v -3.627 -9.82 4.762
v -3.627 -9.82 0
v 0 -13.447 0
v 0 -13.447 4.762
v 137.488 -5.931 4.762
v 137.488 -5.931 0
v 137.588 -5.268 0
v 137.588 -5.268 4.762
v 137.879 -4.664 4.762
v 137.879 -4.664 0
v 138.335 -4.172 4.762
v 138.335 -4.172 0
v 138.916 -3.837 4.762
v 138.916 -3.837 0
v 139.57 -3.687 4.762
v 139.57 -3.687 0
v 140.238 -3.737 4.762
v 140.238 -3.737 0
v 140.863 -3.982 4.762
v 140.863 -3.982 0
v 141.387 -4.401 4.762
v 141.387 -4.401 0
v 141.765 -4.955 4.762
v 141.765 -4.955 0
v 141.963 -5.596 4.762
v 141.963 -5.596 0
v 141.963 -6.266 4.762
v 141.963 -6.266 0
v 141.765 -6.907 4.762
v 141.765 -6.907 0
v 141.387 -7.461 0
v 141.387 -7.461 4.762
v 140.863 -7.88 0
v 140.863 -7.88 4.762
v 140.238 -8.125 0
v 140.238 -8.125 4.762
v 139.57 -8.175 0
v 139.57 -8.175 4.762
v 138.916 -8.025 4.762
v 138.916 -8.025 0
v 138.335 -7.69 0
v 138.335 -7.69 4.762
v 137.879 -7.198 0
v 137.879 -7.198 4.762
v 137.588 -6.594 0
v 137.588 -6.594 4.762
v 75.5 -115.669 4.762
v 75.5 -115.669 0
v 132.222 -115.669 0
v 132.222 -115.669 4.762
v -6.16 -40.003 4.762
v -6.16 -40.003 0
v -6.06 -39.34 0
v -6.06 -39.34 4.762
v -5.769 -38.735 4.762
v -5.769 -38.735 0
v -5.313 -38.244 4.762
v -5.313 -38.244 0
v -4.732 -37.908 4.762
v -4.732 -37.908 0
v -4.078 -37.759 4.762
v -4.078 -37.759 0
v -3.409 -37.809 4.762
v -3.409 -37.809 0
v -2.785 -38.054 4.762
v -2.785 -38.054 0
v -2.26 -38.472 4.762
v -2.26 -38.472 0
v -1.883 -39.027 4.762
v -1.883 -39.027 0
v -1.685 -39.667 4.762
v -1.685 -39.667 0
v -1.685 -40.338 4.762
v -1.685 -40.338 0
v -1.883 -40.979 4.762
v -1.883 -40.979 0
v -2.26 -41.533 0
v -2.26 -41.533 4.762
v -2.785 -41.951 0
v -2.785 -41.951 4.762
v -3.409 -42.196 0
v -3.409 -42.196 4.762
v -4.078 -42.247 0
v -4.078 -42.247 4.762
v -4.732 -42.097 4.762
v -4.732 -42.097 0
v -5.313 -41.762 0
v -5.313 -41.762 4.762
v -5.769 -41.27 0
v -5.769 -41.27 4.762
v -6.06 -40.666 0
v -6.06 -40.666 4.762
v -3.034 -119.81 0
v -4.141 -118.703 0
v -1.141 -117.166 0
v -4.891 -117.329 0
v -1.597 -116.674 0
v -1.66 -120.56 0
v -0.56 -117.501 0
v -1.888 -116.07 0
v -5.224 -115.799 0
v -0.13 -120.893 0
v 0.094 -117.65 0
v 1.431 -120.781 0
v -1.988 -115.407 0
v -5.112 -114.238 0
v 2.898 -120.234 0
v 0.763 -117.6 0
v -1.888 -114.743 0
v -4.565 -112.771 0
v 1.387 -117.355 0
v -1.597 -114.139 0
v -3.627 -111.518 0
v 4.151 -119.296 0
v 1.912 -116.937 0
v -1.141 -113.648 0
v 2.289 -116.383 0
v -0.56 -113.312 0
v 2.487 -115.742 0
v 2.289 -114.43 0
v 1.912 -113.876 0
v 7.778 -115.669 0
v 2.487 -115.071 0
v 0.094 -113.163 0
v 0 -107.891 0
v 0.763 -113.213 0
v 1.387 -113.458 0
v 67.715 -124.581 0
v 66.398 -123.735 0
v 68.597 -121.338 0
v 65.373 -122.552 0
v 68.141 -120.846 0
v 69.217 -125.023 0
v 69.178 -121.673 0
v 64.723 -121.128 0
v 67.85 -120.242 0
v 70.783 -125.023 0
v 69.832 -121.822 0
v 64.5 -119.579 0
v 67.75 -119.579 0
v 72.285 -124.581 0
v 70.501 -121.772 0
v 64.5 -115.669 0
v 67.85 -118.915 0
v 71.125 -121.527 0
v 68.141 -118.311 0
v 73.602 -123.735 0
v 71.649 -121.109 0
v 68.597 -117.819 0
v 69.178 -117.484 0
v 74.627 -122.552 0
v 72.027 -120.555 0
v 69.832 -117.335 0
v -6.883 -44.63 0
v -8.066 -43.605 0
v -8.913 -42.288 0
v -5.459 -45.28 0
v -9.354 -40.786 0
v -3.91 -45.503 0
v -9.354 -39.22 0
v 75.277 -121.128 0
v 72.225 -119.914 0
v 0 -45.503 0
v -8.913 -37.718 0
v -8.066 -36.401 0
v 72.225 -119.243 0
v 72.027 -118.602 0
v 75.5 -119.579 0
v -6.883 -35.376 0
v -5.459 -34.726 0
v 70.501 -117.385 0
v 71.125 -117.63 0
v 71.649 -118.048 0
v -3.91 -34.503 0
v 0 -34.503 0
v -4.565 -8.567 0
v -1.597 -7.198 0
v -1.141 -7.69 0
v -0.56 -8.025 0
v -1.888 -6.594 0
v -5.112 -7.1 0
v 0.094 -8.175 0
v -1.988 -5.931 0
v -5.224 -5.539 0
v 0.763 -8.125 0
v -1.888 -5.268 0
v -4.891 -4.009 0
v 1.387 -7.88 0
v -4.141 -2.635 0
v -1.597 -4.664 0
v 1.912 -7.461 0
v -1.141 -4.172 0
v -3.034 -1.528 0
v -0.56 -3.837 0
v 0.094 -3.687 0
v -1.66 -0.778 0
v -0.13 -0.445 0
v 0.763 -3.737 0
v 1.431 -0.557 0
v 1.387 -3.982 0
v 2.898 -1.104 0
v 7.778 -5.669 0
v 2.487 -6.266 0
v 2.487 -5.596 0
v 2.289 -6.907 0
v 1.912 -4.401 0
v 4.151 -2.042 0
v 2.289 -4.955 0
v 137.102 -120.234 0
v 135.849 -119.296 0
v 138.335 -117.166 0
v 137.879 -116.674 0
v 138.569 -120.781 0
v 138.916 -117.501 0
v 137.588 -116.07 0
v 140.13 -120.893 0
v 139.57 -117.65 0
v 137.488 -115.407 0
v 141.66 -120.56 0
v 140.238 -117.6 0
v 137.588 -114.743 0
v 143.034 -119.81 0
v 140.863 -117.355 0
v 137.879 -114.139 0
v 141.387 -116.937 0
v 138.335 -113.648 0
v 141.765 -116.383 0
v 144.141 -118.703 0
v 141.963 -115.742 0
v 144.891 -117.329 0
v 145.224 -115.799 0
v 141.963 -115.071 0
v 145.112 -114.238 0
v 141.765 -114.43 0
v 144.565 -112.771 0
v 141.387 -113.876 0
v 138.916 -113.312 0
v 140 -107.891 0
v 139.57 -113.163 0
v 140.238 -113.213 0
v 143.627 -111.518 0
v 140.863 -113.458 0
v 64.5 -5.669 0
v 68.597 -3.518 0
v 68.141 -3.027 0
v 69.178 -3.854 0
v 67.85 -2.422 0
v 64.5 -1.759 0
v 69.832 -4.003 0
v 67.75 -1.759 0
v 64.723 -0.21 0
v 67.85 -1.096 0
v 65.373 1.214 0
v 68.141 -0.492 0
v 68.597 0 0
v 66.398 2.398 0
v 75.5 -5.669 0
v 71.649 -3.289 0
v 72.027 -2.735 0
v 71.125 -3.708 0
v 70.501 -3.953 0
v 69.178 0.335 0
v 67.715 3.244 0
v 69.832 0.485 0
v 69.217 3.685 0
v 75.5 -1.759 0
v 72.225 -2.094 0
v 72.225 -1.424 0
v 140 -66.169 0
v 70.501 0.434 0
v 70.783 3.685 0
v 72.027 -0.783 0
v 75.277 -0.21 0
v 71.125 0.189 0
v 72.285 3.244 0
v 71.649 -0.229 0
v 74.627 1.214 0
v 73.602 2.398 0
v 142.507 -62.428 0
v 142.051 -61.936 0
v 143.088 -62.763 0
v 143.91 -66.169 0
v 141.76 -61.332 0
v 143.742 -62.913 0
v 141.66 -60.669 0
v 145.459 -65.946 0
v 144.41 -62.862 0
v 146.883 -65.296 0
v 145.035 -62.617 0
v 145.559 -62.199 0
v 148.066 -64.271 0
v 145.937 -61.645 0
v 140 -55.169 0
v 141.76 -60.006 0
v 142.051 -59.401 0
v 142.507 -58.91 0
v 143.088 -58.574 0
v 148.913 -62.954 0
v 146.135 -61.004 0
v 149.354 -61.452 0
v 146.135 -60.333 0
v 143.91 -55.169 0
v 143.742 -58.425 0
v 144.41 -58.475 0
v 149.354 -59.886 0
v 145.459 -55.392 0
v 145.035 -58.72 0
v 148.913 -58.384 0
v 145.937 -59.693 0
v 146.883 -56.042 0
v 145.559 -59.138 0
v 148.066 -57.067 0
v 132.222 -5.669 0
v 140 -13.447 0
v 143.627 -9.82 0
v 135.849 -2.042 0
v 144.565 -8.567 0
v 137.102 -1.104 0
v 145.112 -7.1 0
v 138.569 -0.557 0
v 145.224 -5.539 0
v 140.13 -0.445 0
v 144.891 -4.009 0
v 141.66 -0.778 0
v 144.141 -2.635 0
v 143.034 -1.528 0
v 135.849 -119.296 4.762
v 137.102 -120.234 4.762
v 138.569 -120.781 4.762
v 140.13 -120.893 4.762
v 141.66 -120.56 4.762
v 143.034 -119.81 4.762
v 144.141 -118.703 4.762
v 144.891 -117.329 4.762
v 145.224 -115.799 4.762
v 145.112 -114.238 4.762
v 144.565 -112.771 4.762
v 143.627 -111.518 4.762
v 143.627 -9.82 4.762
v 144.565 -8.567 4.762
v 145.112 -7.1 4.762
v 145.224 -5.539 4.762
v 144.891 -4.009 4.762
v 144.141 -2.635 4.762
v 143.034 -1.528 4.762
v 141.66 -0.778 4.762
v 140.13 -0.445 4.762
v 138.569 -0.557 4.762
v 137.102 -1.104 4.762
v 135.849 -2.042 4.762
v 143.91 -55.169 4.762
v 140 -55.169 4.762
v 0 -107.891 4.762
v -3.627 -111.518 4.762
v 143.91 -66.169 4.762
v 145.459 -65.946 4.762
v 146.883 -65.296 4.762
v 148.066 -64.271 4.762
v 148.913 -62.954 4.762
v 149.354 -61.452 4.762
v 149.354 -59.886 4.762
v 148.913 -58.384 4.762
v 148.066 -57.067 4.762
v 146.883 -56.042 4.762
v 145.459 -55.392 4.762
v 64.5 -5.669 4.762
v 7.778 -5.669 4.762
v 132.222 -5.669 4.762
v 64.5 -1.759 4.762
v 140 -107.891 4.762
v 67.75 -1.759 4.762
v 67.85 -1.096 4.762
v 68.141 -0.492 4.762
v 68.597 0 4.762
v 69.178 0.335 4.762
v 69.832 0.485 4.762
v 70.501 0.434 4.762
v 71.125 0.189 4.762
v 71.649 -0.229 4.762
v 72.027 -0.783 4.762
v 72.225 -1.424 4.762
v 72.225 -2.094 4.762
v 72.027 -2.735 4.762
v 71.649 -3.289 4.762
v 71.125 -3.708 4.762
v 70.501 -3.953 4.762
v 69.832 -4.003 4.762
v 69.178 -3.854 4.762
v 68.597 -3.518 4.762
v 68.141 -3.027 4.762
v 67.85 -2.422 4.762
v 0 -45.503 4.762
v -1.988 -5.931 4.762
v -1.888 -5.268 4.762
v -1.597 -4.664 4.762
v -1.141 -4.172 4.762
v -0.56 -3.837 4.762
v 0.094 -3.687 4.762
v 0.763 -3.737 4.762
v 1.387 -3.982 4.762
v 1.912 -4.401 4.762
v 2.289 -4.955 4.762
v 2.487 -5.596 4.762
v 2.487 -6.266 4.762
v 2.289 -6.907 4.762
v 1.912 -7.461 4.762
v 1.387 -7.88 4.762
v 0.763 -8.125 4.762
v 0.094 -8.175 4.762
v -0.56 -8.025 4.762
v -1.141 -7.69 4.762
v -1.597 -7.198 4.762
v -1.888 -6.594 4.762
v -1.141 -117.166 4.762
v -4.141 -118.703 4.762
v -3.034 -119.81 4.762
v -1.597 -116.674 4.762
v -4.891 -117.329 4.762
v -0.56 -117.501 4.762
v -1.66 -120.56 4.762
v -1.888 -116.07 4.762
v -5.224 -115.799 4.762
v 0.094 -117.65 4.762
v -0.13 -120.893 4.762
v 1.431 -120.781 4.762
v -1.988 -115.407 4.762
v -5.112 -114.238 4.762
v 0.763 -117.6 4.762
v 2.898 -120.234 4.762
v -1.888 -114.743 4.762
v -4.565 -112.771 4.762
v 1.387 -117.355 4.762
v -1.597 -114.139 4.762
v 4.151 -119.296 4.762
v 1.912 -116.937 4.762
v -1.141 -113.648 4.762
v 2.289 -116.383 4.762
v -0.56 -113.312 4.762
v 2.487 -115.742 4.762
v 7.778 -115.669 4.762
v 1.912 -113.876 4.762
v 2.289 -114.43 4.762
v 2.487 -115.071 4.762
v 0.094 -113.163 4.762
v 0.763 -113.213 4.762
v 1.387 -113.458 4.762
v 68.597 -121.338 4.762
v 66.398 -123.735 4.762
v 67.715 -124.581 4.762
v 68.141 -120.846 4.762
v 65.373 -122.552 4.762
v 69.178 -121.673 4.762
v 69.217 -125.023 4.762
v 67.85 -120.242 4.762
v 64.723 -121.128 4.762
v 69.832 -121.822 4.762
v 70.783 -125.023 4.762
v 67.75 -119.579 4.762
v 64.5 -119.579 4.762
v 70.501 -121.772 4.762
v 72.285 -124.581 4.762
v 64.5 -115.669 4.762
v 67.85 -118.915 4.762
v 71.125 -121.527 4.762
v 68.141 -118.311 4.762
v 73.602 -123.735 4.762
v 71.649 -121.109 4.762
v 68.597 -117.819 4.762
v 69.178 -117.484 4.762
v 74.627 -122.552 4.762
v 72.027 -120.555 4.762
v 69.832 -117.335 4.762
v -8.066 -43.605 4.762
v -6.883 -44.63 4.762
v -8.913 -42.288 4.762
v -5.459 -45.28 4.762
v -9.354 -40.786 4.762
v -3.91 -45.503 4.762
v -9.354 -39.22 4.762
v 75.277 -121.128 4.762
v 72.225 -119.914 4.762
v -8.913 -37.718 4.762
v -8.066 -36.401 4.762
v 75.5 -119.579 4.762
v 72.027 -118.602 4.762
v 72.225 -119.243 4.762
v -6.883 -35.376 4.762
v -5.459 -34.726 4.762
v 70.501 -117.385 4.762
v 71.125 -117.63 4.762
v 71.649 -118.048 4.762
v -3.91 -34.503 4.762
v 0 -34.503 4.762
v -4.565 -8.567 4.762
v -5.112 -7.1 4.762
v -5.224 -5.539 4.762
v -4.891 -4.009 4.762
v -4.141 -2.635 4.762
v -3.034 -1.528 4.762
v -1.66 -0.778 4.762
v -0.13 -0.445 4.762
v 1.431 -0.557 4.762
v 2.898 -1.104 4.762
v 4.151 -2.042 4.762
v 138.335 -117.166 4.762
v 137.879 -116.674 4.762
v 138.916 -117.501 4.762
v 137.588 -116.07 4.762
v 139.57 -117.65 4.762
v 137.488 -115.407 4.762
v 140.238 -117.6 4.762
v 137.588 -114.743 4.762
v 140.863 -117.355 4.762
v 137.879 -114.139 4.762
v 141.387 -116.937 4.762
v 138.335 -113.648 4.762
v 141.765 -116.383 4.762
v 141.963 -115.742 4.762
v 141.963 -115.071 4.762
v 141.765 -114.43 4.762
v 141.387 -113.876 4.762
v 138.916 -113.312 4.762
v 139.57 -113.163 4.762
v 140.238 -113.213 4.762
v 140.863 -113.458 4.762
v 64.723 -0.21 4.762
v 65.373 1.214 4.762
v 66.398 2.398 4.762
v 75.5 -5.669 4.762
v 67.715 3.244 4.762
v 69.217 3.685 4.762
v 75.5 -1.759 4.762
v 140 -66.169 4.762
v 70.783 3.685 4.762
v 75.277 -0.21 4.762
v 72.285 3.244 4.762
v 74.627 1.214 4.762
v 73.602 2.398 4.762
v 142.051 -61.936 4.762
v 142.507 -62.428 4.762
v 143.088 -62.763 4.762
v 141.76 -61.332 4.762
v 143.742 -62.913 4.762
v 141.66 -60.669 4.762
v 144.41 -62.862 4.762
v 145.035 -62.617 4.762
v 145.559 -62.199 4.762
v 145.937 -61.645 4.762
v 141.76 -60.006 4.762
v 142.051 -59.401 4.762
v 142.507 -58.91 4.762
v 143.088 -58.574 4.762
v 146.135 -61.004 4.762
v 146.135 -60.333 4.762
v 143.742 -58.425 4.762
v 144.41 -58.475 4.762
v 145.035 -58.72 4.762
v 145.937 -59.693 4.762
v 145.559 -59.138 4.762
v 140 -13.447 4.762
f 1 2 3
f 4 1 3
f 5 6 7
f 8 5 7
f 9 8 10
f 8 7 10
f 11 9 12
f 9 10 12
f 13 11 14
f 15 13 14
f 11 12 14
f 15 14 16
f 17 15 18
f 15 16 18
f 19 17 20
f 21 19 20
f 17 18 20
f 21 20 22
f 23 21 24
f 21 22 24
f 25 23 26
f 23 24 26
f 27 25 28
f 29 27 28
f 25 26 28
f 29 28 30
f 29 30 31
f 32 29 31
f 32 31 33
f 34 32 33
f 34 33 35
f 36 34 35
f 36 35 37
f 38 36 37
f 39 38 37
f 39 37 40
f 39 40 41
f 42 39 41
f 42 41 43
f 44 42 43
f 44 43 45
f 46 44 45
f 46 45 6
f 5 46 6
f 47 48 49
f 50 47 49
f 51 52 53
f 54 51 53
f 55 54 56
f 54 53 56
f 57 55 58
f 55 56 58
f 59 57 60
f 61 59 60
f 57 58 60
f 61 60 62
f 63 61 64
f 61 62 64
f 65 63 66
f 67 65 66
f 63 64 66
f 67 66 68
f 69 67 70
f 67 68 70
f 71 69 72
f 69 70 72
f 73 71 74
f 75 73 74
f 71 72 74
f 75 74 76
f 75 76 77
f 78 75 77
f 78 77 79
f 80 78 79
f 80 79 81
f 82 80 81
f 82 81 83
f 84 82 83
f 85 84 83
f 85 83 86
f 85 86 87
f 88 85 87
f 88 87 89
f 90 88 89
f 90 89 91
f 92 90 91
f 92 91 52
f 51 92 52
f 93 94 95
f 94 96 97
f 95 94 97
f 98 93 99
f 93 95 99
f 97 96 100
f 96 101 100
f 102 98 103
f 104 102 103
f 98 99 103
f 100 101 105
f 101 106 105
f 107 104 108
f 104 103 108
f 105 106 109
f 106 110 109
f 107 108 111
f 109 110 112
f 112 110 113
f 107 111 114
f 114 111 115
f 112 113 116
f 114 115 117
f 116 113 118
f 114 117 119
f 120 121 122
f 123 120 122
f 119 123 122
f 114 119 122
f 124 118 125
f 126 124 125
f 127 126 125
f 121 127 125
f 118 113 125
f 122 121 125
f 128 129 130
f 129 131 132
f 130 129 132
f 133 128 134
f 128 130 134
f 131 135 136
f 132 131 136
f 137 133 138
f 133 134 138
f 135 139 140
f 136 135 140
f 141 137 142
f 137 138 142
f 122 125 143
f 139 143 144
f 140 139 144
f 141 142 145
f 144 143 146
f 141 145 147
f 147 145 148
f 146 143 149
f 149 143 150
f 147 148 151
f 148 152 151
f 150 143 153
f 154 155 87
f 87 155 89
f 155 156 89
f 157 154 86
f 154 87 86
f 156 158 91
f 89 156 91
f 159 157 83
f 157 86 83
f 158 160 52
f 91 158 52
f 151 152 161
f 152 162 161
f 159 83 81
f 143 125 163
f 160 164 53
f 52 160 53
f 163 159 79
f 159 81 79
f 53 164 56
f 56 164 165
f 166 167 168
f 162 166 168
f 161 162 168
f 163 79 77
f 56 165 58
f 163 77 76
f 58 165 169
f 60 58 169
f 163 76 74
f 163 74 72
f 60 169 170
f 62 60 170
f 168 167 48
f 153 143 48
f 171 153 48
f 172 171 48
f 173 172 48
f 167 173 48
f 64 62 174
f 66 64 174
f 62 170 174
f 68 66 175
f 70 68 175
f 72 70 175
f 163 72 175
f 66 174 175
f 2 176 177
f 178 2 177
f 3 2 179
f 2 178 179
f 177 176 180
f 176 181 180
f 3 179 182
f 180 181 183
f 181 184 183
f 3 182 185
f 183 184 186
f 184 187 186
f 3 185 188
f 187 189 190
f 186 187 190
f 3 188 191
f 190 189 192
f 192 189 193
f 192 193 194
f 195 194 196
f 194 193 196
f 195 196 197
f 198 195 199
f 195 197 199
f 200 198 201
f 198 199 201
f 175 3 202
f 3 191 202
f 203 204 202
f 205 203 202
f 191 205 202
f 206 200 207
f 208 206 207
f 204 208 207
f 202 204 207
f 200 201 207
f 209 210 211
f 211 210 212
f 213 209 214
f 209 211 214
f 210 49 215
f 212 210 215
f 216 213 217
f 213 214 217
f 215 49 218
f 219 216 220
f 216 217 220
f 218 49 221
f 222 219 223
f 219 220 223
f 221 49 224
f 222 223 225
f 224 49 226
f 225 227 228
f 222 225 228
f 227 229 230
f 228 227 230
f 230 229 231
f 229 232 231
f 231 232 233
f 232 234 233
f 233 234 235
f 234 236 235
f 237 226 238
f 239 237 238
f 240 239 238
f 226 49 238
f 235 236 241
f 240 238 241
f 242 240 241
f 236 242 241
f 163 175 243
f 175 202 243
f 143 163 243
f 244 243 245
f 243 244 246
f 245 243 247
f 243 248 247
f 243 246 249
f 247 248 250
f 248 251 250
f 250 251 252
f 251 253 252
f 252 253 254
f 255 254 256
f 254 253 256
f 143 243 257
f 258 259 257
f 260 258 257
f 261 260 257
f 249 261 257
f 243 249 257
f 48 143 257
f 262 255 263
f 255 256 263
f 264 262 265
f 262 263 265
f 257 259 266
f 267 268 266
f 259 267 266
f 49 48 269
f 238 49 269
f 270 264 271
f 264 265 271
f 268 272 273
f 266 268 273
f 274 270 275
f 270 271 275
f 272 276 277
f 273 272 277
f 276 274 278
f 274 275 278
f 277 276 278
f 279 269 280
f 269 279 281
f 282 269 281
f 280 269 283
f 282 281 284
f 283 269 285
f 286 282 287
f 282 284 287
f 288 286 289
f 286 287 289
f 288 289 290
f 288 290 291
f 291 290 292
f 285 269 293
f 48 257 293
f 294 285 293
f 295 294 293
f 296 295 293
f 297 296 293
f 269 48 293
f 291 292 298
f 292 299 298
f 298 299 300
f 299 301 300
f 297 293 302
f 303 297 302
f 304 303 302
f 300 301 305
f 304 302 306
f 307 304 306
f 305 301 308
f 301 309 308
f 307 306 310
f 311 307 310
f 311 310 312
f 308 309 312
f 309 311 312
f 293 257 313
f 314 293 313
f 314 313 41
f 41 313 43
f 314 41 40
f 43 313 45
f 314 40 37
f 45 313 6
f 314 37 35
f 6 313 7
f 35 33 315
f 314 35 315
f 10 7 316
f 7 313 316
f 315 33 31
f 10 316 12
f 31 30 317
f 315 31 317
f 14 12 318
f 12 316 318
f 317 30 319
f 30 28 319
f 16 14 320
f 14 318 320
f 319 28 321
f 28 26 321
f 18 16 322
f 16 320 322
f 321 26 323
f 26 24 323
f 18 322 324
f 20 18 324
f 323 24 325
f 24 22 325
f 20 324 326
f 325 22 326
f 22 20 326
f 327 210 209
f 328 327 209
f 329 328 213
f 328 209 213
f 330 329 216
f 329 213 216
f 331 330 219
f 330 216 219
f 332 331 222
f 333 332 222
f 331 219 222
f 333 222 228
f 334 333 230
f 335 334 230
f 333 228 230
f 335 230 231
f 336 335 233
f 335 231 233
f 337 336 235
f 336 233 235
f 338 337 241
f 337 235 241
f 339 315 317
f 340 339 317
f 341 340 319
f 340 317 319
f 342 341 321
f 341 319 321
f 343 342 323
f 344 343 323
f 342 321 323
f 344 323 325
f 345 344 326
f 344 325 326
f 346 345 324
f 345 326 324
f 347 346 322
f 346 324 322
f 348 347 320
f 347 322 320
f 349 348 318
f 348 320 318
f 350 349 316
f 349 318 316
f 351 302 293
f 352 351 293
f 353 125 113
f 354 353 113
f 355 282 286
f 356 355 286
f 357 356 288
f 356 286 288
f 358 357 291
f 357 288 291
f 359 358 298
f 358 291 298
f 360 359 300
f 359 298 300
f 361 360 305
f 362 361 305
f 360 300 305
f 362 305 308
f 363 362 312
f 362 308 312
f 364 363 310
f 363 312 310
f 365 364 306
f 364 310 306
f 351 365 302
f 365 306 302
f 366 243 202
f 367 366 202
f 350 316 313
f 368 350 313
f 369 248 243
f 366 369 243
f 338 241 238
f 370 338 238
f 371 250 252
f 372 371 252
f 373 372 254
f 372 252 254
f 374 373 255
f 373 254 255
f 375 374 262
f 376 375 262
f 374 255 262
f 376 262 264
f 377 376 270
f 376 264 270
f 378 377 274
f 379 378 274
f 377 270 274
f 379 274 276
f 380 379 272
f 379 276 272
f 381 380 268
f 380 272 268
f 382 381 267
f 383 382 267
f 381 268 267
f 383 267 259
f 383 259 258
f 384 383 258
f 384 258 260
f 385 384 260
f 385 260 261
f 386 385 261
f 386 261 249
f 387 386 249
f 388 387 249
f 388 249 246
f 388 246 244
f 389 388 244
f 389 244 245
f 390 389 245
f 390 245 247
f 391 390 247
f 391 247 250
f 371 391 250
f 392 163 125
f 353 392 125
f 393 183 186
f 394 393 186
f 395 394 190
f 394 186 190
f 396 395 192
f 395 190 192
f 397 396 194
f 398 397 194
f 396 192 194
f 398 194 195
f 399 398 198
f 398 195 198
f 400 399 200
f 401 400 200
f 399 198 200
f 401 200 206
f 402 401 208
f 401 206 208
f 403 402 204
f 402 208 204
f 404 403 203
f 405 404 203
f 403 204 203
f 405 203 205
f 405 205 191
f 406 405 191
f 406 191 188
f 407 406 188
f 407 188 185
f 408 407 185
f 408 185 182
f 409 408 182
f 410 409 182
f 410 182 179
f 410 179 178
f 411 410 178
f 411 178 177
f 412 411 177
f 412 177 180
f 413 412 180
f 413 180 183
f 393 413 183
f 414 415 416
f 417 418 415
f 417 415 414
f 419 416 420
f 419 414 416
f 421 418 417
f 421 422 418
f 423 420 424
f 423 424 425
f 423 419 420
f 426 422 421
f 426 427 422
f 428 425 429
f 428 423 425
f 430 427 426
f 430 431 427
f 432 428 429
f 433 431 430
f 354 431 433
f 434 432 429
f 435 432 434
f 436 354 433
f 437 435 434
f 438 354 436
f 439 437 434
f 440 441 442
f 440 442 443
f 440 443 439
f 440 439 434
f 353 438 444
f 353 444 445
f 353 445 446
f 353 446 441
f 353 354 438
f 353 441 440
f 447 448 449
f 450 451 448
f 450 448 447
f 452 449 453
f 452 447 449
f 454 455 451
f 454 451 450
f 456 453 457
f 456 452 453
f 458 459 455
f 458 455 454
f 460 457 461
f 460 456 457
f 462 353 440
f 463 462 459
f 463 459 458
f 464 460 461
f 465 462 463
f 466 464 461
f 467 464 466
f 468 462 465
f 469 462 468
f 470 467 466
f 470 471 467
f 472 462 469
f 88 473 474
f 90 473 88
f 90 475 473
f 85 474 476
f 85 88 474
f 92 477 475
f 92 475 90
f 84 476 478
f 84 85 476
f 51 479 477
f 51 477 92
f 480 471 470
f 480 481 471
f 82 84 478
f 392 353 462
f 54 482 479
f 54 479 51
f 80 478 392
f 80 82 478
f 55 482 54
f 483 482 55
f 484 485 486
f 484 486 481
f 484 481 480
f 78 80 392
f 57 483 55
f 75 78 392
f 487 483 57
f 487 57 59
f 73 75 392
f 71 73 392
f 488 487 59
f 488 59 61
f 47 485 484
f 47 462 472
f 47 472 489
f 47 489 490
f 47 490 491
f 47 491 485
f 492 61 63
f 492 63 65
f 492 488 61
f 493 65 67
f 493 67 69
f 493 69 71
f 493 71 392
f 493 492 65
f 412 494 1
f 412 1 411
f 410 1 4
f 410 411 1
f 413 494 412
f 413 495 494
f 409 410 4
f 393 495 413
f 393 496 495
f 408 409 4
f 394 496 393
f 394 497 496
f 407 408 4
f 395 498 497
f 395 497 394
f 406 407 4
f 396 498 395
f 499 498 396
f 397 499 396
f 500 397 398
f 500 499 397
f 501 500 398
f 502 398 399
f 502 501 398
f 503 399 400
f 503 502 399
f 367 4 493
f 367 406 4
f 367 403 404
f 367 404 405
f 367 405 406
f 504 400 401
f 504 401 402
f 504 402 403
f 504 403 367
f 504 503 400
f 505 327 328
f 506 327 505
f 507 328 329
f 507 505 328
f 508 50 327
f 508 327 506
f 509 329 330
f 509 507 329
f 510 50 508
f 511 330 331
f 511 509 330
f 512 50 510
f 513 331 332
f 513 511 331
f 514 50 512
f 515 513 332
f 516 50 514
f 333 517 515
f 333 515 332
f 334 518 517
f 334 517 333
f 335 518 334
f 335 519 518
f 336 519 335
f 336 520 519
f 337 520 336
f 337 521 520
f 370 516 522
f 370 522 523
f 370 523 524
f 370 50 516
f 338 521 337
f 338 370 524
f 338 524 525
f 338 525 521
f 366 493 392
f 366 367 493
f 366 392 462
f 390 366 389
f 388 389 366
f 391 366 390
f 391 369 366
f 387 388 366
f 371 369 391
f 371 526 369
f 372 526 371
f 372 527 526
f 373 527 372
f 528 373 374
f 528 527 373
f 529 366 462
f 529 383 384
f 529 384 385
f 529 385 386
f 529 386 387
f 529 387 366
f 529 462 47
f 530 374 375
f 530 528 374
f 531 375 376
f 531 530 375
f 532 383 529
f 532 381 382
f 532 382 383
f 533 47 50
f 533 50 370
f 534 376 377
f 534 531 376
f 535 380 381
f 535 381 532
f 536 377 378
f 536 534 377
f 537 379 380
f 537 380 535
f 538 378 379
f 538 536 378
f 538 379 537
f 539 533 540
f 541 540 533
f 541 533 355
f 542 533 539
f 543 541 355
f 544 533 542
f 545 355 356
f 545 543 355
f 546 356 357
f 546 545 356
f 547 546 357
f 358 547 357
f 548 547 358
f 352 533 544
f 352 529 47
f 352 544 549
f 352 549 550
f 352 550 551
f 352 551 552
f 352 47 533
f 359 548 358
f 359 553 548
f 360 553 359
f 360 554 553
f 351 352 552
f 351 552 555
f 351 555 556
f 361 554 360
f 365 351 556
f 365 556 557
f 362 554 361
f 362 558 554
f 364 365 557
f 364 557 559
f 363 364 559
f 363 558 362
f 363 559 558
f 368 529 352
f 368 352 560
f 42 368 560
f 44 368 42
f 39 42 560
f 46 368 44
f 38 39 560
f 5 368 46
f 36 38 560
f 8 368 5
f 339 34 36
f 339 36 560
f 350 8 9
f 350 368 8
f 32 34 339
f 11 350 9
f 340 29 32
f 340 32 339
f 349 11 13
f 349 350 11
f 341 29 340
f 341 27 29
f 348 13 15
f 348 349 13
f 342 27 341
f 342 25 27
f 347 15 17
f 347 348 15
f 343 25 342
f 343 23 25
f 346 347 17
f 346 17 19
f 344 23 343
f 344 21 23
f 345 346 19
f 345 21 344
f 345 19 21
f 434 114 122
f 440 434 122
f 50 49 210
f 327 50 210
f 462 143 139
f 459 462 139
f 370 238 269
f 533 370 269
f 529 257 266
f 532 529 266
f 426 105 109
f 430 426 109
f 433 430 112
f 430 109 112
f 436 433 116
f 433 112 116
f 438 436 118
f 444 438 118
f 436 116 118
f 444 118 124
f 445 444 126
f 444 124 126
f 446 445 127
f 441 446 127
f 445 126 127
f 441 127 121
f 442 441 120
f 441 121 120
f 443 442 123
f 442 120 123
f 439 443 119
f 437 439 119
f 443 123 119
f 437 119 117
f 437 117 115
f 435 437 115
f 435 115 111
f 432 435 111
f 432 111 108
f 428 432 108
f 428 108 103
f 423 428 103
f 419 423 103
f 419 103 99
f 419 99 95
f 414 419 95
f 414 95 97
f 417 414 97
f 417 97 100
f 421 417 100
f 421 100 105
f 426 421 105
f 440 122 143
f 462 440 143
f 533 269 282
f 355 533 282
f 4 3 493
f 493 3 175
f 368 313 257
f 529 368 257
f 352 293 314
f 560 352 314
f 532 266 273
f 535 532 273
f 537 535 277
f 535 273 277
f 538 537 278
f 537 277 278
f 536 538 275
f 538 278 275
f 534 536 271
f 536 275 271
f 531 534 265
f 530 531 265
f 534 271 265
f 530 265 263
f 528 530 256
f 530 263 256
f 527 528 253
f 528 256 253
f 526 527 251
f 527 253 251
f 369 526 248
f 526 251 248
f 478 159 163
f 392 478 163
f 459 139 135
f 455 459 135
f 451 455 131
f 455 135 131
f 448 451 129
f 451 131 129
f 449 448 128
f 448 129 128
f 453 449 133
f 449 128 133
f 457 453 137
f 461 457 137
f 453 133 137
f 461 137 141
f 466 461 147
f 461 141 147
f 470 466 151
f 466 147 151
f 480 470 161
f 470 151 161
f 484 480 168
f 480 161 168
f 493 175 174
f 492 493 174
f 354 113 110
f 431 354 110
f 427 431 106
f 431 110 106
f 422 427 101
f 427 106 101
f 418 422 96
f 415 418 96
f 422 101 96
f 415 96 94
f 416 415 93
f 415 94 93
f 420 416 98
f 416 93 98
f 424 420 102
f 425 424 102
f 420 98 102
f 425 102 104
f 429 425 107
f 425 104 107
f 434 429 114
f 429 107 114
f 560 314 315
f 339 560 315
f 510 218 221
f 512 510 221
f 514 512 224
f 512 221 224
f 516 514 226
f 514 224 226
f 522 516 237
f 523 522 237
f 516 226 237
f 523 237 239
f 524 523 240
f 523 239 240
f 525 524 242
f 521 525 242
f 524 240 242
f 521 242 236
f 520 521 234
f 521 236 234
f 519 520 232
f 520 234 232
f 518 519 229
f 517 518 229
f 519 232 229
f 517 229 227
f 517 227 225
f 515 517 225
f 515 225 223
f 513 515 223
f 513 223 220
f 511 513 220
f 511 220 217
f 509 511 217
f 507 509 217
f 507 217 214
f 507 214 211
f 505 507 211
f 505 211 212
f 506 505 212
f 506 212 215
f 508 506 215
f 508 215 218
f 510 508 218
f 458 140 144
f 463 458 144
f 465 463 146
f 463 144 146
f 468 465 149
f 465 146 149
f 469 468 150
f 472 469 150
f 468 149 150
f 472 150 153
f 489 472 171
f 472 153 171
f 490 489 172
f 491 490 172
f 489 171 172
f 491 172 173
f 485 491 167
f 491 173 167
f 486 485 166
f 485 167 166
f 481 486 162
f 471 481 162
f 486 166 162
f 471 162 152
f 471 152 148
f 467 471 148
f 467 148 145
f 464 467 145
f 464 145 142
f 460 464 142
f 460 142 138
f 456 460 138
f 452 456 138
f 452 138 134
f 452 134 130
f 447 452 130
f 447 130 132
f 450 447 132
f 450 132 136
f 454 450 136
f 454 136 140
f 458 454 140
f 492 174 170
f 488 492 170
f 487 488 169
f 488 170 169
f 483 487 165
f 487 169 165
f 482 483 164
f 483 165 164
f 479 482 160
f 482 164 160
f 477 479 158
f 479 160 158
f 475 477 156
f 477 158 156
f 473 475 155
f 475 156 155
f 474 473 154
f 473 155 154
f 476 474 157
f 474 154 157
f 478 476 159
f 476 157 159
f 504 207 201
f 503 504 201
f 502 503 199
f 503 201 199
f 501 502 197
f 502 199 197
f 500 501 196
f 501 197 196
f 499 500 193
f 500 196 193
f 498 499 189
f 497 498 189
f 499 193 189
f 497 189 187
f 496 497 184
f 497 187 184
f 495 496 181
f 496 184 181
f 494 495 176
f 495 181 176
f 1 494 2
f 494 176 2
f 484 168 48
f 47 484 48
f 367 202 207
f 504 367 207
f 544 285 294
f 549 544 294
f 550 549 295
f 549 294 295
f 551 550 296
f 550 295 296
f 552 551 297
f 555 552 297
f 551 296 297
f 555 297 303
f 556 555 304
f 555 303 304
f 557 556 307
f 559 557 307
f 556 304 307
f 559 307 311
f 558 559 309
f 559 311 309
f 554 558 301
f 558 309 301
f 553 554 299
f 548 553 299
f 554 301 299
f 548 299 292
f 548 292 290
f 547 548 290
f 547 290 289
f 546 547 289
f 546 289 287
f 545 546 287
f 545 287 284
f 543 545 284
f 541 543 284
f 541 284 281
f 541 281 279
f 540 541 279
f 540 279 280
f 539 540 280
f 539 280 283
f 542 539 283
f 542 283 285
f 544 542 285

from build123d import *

# Parameters (mm, degrees)
BOSS_EXTRUDE1_DEPTH  = 4.7625
M4_CLEARANCE_HOLE1_D = 4.5


with BuildPart() as part:
    # Sketch1 → Boss-Extrude1 (new body)
    with BuildSketch(Plane.XY):
        with BuildLine():
            Line((-3.626904156, -9.820077826), (0, -13.446981982))
            Line((0, -13.446981982), (0, -33.529852105))
            Line((0, -33.529852105), (0, -34.502807389))
            Line((0, -34.502807389), (-3.9097, -34.502807389))
            ThreePointArc((-3.9097, -34.502807389), (-9.4097, -40.002807389), (-3.9097, -45.502807389))
            Line((-3.9097, -45.502807389), (0, -45.502807389))
            Line((0, -45.502807389), (0, -46.902807389))
            Line((0, -46.902807389), (0, -51.502807389))
            Line((0, -51.502807389), (0, -107.890632795))
            Line((0, -107.890632795), (-3.626904156, -111.517536951))
            ThreePointArc((-3.626904156, -111.517536951), (-3.626904156, -119.295711544), (4.151270437, -119.295711544))
            Line((4.151270437, -119.295711544), (7.778174593, -115.668807389))
            Line((7.778174593, -115.668807389), (64.5, -115.668807389))
            Line((64.5, -115.668807389), (64.5, -119.578507389))
            ThreePointArc((64.5, -119.578507389), (70, -125.078507389), (75.5, -119.578507389))
            Line((75.5, -119.578507389), (75.5, -115.668807389))
            Line((75.5, -115.668807389), (132.221825407, -115.668807389))
            Line((132.221825407, -115.668807389), (135.848729563, -119.295711544))
            ThreePointArc((135.848729563, -119.295711544), (143.626904156, -119.295711544), (143.626904156, -111.517536951))
            Line((143.626904156, -111.517536951), (140, -107.890632795))
            Line((140, -107.890632795), (140, -66.168807389))
            Line((140, -66.168807389), (143.9097, -66.168807389))
            ThreePointArc((143.9097, -66.168807389), (149.4097, -60.668807389), (143.9097, -55.168807389))
            Line((143.9097, -55.168807389), (140, -55.168807389))
            Line((140, -55.168807389), (140, -13.446981982))
            Line((140, -13.446981982), (143.626904156, -9.820077826))
            ThreePointArc((143.626904156, -9.820077826), (143.626904156, -2.041903233), (135.848729563, -2.041903233))
            Line((135.848729563, -2.041903233), (132.221825407, -5.668807389))
            Line((132.221825407, -5.668807389), (75.5, -5.668807389))
            Line((75.5, -5.668807389), (75.5, -1.759107389))
            ThreePointArc((75.5, -1.759107389), (70, 3.740892611), (64.5, -1.759107389))
            Line((64.5, -1.759107389), (64.5, -5.668807389))
            Line((64.5, -5.668807389), (7.778174593, -5.668807389))
            Line((7.778174593, -5.668807389), (4.151270437, -2.041903233))
            ThreePointArc((4.151270437, -2.041903233), (-3.626904156, -2.041903233), (-3.626904156, -9.820077826))
        make_face()
    extrude(amount=BOSS_EXTRUDE1_DEPTH)

    # M4 Clearance Hole1 (through all)
    with Locations(Plane.XY.offset(4.7625)):
        with Locations((0.262183141, -5.930990529), (-3.9097, -40.002807389), (0.262183141, -115.406624248), (70, -119.578507389), (139.737816859, -115.406624248), (143.9097, -60.668807389), (139.737816859, -5.930990529), (70, -1.759107389)):
            Hole(M4_CLEARANCE_HOLE1_D / 2)


solid = part.part
